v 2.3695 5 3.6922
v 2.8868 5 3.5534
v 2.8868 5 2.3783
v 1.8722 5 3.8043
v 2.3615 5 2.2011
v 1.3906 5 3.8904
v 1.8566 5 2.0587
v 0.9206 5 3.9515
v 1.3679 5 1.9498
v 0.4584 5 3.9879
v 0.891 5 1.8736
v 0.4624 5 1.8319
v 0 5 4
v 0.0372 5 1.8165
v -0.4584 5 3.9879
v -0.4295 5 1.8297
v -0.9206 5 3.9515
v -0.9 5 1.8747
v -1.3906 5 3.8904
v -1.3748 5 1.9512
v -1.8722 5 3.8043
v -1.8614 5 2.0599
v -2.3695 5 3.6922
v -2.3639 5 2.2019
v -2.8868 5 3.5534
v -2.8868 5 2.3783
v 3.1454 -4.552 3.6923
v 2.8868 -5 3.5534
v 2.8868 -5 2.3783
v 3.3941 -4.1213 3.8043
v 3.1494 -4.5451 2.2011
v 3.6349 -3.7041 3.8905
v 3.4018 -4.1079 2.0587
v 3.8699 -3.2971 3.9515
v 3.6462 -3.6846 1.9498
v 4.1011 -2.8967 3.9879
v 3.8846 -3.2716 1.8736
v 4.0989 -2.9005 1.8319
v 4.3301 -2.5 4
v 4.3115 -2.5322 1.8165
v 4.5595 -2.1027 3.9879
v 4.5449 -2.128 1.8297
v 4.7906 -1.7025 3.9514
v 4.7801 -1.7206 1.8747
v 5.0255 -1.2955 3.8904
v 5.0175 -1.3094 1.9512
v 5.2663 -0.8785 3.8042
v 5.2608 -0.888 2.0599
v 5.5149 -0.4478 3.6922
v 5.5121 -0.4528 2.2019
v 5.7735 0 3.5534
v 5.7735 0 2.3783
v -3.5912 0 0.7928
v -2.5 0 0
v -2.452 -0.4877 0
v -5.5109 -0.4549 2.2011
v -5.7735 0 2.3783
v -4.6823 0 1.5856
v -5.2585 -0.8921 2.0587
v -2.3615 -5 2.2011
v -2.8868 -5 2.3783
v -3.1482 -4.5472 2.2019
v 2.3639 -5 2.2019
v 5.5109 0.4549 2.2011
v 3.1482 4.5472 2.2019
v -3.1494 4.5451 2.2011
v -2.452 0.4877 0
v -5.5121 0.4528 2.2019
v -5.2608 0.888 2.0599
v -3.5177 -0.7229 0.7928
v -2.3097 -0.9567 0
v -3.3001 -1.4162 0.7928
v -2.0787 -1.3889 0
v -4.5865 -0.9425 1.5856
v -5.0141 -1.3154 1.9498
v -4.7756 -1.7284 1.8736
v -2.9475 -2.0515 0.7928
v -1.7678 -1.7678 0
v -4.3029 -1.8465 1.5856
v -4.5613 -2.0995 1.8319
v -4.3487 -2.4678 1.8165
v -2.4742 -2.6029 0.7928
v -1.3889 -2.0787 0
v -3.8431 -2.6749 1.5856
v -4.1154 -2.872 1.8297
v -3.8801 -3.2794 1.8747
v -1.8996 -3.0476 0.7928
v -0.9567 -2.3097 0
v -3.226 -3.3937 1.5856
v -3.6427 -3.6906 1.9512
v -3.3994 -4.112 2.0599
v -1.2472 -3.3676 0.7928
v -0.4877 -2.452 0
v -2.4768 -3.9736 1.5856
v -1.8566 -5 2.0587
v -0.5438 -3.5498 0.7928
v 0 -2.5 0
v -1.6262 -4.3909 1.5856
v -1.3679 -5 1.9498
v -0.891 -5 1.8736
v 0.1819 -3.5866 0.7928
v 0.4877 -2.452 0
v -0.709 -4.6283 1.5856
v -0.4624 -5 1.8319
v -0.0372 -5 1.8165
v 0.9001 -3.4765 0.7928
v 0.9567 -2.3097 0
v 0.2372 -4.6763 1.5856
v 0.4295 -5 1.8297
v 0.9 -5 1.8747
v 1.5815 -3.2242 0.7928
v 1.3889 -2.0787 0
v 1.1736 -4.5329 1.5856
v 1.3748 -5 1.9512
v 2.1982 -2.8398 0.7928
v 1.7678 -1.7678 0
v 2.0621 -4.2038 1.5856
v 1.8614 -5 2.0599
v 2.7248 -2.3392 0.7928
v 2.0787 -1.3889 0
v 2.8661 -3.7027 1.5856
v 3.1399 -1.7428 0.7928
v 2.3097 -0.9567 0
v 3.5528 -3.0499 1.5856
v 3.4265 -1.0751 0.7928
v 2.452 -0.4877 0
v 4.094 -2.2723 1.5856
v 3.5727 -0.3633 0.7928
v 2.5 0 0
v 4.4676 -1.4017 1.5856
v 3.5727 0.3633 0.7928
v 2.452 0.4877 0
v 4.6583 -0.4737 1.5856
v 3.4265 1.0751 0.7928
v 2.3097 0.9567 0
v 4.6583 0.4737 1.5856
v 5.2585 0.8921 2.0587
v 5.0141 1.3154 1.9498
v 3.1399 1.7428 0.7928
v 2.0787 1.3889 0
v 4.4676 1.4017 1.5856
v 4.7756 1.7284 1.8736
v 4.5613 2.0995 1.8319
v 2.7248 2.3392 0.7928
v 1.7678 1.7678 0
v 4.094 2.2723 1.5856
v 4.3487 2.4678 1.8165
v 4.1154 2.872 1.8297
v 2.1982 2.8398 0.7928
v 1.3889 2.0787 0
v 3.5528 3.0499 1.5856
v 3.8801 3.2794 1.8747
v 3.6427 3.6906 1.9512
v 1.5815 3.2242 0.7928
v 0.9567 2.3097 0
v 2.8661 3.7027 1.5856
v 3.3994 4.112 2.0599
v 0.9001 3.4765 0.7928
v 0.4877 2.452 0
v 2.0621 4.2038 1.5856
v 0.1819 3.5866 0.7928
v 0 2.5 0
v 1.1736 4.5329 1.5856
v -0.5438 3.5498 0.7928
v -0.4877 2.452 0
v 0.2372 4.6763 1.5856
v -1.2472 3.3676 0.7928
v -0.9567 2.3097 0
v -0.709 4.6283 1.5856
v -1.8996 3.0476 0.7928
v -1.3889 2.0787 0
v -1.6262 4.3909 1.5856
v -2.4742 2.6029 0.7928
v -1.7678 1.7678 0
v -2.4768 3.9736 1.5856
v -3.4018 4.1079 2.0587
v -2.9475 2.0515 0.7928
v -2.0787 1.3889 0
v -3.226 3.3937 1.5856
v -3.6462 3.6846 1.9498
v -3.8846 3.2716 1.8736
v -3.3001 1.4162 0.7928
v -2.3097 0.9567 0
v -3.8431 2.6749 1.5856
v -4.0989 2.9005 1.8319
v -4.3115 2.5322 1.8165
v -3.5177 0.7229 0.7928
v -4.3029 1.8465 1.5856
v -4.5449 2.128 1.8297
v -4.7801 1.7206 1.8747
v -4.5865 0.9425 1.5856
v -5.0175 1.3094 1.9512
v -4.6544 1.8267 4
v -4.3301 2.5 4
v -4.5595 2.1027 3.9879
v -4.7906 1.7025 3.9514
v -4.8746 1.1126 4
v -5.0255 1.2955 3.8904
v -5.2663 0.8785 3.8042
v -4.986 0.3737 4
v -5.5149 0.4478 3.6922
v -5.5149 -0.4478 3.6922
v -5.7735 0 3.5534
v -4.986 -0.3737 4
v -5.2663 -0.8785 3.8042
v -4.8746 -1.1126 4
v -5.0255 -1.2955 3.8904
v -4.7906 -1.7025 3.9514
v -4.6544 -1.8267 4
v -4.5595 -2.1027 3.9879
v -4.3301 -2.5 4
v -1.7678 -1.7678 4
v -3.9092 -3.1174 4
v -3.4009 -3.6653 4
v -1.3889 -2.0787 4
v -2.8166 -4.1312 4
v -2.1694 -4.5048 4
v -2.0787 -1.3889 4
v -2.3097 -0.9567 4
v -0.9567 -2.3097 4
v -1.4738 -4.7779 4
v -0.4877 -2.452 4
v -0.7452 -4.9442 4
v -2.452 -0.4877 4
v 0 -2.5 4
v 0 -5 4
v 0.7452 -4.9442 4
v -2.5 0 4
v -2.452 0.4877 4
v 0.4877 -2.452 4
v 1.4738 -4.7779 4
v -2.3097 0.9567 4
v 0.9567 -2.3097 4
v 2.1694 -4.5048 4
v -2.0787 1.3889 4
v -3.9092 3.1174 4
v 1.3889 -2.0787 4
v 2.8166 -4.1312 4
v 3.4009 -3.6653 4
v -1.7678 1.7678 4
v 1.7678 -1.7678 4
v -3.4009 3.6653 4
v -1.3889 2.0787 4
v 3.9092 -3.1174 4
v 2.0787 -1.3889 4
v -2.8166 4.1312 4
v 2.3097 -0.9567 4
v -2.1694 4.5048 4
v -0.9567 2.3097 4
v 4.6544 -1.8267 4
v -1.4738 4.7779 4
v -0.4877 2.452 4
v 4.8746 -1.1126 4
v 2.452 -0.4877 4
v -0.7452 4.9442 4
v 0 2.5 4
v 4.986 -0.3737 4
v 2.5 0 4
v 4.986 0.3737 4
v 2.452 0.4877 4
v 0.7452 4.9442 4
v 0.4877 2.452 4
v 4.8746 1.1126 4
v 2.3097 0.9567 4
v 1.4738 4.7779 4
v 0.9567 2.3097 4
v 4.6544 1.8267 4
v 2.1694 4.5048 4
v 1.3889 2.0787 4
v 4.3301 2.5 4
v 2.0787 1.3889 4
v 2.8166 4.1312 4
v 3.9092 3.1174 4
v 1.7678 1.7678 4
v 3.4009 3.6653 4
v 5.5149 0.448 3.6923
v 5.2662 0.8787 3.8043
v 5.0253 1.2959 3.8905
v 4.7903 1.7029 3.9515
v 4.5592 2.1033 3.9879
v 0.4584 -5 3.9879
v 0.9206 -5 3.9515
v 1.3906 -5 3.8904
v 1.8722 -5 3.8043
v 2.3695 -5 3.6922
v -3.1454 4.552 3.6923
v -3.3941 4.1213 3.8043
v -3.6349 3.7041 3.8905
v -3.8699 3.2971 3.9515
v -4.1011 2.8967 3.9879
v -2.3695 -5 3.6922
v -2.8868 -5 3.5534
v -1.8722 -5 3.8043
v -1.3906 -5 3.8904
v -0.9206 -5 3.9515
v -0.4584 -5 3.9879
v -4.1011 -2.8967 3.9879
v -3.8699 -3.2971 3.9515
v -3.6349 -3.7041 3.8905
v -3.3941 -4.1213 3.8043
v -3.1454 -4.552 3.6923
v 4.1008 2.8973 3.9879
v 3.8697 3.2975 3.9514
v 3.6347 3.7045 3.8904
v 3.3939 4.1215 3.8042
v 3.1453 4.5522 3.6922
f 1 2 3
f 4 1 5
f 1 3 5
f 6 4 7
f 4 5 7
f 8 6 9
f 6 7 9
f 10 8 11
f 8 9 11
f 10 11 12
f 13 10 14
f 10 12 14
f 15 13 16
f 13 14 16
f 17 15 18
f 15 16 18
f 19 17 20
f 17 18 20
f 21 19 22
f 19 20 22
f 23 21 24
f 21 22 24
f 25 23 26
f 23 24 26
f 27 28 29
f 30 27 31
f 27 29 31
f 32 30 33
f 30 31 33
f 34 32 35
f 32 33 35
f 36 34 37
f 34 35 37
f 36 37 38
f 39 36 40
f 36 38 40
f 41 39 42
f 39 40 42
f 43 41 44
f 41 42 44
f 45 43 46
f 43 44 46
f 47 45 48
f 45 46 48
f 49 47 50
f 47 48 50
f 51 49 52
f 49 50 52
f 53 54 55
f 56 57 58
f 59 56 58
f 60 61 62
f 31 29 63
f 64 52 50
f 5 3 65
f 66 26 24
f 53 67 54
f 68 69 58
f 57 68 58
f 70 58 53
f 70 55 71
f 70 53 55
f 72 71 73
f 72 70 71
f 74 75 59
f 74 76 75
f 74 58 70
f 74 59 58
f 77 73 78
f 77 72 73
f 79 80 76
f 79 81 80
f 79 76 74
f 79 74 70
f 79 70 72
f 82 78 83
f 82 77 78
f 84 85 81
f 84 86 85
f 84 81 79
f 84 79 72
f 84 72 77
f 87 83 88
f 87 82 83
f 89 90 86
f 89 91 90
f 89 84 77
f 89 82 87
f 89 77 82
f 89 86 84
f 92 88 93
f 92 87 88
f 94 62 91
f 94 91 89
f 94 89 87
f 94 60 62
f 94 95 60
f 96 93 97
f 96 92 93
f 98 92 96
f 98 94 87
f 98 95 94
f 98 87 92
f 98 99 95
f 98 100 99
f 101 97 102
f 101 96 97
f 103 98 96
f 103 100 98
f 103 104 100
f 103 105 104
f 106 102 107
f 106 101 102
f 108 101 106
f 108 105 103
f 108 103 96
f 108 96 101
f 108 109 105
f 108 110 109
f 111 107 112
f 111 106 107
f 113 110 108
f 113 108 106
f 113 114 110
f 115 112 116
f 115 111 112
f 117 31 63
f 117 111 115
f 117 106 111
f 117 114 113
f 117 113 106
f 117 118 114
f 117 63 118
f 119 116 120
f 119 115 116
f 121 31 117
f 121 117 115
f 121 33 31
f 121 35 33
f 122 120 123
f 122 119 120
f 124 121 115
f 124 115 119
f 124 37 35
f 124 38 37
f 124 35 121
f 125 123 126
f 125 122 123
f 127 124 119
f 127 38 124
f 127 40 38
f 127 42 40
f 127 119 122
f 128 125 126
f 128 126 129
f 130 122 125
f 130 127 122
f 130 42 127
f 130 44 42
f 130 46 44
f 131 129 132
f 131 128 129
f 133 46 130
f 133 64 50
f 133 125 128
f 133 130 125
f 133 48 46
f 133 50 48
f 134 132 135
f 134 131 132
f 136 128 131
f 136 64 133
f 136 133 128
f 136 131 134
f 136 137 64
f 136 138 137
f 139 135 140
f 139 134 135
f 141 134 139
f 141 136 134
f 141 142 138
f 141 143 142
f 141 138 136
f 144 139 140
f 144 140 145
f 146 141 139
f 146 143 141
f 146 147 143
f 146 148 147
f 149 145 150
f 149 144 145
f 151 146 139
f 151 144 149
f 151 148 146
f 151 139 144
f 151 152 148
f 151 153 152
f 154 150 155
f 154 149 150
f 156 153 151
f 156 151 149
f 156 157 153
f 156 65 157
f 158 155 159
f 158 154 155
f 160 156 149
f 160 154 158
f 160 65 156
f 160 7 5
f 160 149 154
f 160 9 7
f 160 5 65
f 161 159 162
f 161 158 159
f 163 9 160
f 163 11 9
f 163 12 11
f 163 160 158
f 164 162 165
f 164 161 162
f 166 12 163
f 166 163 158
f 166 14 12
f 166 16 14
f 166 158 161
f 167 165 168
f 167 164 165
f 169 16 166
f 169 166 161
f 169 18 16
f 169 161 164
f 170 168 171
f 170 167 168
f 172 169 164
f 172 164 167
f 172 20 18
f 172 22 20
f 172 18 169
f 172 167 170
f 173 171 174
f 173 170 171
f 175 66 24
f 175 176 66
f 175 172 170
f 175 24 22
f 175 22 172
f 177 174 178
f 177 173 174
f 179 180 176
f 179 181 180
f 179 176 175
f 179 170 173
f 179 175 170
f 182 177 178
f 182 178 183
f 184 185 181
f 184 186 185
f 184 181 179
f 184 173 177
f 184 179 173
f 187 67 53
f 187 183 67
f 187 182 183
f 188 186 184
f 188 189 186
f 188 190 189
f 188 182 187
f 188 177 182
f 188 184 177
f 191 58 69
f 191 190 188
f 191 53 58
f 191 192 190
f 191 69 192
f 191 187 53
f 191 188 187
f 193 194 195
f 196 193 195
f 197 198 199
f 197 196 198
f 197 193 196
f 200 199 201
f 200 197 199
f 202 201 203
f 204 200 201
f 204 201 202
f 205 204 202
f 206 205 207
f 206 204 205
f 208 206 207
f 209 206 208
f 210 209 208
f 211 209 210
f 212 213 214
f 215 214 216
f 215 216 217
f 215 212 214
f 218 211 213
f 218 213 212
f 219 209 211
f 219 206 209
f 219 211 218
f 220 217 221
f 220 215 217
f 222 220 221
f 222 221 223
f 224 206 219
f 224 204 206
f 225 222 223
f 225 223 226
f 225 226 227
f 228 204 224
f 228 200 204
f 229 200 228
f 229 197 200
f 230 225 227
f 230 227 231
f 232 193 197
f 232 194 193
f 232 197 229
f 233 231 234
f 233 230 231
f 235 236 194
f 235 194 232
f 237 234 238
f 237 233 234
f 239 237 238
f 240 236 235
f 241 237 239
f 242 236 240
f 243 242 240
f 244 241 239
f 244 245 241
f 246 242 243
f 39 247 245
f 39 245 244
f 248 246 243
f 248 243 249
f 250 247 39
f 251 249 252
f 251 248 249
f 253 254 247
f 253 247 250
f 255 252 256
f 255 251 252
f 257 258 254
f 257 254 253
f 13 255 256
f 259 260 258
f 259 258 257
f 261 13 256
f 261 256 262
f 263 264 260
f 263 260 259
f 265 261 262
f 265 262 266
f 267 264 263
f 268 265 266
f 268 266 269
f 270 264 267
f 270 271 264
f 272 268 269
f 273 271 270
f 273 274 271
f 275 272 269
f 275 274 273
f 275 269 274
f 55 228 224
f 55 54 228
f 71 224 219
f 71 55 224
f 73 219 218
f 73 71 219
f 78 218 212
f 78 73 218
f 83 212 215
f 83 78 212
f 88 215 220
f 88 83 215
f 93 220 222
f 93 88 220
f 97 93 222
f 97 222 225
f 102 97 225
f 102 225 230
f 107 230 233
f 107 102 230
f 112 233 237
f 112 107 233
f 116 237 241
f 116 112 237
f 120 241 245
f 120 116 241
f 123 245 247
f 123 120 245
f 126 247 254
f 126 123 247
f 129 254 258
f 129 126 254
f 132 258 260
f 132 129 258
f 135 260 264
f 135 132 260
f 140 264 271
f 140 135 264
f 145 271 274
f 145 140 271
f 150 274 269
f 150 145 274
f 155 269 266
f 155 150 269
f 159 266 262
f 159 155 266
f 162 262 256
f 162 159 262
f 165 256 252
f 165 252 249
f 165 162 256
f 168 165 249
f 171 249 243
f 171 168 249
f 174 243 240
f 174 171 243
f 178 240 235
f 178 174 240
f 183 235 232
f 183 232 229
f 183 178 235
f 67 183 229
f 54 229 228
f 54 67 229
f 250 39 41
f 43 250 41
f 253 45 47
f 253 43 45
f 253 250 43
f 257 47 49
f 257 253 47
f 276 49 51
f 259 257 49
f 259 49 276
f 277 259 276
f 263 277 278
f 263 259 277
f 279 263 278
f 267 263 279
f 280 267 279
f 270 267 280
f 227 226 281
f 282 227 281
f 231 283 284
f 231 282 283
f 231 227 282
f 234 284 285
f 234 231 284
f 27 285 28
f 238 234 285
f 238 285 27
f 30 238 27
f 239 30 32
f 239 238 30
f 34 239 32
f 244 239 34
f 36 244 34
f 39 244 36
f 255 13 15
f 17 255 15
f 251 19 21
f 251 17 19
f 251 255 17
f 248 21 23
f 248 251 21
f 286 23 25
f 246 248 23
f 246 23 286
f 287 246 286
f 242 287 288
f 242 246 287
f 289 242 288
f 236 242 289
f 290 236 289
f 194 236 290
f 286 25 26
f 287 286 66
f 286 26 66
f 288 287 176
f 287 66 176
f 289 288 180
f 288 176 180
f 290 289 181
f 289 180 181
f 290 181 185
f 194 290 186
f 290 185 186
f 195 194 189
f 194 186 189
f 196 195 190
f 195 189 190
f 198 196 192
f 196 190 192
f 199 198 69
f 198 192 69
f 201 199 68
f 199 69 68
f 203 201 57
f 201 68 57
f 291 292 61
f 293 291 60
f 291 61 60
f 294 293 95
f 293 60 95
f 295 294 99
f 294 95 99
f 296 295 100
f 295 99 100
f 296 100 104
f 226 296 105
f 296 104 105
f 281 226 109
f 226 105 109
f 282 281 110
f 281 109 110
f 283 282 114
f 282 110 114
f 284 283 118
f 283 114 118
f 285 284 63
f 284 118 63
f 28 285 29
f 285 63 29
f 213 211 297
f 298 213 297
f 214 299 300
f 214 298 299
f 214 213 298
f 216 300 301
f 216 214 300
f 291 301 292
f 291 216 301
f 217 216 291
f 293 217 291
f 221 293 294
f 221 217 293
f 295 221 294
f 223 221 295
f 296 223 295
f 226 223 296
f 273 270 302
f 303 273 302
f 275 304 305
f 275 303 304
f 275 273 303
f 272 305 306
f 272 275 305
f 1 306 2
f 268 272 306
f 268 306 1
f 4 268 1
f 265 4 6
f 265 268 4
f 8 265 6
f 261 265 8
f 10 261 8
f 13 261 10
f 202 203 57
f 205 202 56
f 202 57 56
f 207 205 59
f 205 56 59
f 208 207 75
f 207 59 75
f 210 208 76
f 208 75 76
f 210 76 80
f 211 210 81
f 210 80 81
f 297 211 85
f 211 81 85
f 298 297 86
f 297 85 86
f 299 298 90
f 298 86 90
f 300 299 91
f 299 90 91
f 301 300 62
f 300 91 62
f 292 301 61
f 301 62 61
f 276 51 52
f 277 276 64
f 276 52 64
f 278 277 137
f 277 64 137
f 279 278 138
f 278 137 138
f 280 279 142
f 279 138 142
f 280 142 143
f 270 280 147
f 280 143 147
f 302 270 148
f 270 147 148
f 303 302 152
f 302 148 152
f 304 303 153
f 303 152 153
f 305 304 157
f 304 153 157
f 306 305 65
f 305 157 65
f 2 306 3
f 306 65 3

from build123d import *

# Parameters (mm, degrees)
PAD_DEPTH = 4


with BuildPart() as tapered_nut_section_revolution:
    # Sketch007 → Revolution001 (revolve)
    with BuildSketch(Plane.XZ):
        Polygon((-2.5, 0), (-6.674711, 3.033105), (-5, 4), (-2.5, 4), align=None)
    revolve(axis=Axis((0, 0, 0), (0, 0, 1)))


with BuildPart() as tapered_nut_prism_section_common:
    # Sketch008 → Pad (new body)
    with BuildSketch(Plane.XY):
        Polygon((-2.886751, 5), (-5.773503, 0), (-2.886751, -5), (2.886751, -5), (5.773503, 0), (2.886751, 5), align=None)
    extrude(amount=PAD_DEPTH)

    # Common: intersect tapered-nut-section-revolution
    add(tapered_nut_section_revolution.part, mode=Mode.INTERSECT)


solid = tapered_nut_prism_section_common.part
